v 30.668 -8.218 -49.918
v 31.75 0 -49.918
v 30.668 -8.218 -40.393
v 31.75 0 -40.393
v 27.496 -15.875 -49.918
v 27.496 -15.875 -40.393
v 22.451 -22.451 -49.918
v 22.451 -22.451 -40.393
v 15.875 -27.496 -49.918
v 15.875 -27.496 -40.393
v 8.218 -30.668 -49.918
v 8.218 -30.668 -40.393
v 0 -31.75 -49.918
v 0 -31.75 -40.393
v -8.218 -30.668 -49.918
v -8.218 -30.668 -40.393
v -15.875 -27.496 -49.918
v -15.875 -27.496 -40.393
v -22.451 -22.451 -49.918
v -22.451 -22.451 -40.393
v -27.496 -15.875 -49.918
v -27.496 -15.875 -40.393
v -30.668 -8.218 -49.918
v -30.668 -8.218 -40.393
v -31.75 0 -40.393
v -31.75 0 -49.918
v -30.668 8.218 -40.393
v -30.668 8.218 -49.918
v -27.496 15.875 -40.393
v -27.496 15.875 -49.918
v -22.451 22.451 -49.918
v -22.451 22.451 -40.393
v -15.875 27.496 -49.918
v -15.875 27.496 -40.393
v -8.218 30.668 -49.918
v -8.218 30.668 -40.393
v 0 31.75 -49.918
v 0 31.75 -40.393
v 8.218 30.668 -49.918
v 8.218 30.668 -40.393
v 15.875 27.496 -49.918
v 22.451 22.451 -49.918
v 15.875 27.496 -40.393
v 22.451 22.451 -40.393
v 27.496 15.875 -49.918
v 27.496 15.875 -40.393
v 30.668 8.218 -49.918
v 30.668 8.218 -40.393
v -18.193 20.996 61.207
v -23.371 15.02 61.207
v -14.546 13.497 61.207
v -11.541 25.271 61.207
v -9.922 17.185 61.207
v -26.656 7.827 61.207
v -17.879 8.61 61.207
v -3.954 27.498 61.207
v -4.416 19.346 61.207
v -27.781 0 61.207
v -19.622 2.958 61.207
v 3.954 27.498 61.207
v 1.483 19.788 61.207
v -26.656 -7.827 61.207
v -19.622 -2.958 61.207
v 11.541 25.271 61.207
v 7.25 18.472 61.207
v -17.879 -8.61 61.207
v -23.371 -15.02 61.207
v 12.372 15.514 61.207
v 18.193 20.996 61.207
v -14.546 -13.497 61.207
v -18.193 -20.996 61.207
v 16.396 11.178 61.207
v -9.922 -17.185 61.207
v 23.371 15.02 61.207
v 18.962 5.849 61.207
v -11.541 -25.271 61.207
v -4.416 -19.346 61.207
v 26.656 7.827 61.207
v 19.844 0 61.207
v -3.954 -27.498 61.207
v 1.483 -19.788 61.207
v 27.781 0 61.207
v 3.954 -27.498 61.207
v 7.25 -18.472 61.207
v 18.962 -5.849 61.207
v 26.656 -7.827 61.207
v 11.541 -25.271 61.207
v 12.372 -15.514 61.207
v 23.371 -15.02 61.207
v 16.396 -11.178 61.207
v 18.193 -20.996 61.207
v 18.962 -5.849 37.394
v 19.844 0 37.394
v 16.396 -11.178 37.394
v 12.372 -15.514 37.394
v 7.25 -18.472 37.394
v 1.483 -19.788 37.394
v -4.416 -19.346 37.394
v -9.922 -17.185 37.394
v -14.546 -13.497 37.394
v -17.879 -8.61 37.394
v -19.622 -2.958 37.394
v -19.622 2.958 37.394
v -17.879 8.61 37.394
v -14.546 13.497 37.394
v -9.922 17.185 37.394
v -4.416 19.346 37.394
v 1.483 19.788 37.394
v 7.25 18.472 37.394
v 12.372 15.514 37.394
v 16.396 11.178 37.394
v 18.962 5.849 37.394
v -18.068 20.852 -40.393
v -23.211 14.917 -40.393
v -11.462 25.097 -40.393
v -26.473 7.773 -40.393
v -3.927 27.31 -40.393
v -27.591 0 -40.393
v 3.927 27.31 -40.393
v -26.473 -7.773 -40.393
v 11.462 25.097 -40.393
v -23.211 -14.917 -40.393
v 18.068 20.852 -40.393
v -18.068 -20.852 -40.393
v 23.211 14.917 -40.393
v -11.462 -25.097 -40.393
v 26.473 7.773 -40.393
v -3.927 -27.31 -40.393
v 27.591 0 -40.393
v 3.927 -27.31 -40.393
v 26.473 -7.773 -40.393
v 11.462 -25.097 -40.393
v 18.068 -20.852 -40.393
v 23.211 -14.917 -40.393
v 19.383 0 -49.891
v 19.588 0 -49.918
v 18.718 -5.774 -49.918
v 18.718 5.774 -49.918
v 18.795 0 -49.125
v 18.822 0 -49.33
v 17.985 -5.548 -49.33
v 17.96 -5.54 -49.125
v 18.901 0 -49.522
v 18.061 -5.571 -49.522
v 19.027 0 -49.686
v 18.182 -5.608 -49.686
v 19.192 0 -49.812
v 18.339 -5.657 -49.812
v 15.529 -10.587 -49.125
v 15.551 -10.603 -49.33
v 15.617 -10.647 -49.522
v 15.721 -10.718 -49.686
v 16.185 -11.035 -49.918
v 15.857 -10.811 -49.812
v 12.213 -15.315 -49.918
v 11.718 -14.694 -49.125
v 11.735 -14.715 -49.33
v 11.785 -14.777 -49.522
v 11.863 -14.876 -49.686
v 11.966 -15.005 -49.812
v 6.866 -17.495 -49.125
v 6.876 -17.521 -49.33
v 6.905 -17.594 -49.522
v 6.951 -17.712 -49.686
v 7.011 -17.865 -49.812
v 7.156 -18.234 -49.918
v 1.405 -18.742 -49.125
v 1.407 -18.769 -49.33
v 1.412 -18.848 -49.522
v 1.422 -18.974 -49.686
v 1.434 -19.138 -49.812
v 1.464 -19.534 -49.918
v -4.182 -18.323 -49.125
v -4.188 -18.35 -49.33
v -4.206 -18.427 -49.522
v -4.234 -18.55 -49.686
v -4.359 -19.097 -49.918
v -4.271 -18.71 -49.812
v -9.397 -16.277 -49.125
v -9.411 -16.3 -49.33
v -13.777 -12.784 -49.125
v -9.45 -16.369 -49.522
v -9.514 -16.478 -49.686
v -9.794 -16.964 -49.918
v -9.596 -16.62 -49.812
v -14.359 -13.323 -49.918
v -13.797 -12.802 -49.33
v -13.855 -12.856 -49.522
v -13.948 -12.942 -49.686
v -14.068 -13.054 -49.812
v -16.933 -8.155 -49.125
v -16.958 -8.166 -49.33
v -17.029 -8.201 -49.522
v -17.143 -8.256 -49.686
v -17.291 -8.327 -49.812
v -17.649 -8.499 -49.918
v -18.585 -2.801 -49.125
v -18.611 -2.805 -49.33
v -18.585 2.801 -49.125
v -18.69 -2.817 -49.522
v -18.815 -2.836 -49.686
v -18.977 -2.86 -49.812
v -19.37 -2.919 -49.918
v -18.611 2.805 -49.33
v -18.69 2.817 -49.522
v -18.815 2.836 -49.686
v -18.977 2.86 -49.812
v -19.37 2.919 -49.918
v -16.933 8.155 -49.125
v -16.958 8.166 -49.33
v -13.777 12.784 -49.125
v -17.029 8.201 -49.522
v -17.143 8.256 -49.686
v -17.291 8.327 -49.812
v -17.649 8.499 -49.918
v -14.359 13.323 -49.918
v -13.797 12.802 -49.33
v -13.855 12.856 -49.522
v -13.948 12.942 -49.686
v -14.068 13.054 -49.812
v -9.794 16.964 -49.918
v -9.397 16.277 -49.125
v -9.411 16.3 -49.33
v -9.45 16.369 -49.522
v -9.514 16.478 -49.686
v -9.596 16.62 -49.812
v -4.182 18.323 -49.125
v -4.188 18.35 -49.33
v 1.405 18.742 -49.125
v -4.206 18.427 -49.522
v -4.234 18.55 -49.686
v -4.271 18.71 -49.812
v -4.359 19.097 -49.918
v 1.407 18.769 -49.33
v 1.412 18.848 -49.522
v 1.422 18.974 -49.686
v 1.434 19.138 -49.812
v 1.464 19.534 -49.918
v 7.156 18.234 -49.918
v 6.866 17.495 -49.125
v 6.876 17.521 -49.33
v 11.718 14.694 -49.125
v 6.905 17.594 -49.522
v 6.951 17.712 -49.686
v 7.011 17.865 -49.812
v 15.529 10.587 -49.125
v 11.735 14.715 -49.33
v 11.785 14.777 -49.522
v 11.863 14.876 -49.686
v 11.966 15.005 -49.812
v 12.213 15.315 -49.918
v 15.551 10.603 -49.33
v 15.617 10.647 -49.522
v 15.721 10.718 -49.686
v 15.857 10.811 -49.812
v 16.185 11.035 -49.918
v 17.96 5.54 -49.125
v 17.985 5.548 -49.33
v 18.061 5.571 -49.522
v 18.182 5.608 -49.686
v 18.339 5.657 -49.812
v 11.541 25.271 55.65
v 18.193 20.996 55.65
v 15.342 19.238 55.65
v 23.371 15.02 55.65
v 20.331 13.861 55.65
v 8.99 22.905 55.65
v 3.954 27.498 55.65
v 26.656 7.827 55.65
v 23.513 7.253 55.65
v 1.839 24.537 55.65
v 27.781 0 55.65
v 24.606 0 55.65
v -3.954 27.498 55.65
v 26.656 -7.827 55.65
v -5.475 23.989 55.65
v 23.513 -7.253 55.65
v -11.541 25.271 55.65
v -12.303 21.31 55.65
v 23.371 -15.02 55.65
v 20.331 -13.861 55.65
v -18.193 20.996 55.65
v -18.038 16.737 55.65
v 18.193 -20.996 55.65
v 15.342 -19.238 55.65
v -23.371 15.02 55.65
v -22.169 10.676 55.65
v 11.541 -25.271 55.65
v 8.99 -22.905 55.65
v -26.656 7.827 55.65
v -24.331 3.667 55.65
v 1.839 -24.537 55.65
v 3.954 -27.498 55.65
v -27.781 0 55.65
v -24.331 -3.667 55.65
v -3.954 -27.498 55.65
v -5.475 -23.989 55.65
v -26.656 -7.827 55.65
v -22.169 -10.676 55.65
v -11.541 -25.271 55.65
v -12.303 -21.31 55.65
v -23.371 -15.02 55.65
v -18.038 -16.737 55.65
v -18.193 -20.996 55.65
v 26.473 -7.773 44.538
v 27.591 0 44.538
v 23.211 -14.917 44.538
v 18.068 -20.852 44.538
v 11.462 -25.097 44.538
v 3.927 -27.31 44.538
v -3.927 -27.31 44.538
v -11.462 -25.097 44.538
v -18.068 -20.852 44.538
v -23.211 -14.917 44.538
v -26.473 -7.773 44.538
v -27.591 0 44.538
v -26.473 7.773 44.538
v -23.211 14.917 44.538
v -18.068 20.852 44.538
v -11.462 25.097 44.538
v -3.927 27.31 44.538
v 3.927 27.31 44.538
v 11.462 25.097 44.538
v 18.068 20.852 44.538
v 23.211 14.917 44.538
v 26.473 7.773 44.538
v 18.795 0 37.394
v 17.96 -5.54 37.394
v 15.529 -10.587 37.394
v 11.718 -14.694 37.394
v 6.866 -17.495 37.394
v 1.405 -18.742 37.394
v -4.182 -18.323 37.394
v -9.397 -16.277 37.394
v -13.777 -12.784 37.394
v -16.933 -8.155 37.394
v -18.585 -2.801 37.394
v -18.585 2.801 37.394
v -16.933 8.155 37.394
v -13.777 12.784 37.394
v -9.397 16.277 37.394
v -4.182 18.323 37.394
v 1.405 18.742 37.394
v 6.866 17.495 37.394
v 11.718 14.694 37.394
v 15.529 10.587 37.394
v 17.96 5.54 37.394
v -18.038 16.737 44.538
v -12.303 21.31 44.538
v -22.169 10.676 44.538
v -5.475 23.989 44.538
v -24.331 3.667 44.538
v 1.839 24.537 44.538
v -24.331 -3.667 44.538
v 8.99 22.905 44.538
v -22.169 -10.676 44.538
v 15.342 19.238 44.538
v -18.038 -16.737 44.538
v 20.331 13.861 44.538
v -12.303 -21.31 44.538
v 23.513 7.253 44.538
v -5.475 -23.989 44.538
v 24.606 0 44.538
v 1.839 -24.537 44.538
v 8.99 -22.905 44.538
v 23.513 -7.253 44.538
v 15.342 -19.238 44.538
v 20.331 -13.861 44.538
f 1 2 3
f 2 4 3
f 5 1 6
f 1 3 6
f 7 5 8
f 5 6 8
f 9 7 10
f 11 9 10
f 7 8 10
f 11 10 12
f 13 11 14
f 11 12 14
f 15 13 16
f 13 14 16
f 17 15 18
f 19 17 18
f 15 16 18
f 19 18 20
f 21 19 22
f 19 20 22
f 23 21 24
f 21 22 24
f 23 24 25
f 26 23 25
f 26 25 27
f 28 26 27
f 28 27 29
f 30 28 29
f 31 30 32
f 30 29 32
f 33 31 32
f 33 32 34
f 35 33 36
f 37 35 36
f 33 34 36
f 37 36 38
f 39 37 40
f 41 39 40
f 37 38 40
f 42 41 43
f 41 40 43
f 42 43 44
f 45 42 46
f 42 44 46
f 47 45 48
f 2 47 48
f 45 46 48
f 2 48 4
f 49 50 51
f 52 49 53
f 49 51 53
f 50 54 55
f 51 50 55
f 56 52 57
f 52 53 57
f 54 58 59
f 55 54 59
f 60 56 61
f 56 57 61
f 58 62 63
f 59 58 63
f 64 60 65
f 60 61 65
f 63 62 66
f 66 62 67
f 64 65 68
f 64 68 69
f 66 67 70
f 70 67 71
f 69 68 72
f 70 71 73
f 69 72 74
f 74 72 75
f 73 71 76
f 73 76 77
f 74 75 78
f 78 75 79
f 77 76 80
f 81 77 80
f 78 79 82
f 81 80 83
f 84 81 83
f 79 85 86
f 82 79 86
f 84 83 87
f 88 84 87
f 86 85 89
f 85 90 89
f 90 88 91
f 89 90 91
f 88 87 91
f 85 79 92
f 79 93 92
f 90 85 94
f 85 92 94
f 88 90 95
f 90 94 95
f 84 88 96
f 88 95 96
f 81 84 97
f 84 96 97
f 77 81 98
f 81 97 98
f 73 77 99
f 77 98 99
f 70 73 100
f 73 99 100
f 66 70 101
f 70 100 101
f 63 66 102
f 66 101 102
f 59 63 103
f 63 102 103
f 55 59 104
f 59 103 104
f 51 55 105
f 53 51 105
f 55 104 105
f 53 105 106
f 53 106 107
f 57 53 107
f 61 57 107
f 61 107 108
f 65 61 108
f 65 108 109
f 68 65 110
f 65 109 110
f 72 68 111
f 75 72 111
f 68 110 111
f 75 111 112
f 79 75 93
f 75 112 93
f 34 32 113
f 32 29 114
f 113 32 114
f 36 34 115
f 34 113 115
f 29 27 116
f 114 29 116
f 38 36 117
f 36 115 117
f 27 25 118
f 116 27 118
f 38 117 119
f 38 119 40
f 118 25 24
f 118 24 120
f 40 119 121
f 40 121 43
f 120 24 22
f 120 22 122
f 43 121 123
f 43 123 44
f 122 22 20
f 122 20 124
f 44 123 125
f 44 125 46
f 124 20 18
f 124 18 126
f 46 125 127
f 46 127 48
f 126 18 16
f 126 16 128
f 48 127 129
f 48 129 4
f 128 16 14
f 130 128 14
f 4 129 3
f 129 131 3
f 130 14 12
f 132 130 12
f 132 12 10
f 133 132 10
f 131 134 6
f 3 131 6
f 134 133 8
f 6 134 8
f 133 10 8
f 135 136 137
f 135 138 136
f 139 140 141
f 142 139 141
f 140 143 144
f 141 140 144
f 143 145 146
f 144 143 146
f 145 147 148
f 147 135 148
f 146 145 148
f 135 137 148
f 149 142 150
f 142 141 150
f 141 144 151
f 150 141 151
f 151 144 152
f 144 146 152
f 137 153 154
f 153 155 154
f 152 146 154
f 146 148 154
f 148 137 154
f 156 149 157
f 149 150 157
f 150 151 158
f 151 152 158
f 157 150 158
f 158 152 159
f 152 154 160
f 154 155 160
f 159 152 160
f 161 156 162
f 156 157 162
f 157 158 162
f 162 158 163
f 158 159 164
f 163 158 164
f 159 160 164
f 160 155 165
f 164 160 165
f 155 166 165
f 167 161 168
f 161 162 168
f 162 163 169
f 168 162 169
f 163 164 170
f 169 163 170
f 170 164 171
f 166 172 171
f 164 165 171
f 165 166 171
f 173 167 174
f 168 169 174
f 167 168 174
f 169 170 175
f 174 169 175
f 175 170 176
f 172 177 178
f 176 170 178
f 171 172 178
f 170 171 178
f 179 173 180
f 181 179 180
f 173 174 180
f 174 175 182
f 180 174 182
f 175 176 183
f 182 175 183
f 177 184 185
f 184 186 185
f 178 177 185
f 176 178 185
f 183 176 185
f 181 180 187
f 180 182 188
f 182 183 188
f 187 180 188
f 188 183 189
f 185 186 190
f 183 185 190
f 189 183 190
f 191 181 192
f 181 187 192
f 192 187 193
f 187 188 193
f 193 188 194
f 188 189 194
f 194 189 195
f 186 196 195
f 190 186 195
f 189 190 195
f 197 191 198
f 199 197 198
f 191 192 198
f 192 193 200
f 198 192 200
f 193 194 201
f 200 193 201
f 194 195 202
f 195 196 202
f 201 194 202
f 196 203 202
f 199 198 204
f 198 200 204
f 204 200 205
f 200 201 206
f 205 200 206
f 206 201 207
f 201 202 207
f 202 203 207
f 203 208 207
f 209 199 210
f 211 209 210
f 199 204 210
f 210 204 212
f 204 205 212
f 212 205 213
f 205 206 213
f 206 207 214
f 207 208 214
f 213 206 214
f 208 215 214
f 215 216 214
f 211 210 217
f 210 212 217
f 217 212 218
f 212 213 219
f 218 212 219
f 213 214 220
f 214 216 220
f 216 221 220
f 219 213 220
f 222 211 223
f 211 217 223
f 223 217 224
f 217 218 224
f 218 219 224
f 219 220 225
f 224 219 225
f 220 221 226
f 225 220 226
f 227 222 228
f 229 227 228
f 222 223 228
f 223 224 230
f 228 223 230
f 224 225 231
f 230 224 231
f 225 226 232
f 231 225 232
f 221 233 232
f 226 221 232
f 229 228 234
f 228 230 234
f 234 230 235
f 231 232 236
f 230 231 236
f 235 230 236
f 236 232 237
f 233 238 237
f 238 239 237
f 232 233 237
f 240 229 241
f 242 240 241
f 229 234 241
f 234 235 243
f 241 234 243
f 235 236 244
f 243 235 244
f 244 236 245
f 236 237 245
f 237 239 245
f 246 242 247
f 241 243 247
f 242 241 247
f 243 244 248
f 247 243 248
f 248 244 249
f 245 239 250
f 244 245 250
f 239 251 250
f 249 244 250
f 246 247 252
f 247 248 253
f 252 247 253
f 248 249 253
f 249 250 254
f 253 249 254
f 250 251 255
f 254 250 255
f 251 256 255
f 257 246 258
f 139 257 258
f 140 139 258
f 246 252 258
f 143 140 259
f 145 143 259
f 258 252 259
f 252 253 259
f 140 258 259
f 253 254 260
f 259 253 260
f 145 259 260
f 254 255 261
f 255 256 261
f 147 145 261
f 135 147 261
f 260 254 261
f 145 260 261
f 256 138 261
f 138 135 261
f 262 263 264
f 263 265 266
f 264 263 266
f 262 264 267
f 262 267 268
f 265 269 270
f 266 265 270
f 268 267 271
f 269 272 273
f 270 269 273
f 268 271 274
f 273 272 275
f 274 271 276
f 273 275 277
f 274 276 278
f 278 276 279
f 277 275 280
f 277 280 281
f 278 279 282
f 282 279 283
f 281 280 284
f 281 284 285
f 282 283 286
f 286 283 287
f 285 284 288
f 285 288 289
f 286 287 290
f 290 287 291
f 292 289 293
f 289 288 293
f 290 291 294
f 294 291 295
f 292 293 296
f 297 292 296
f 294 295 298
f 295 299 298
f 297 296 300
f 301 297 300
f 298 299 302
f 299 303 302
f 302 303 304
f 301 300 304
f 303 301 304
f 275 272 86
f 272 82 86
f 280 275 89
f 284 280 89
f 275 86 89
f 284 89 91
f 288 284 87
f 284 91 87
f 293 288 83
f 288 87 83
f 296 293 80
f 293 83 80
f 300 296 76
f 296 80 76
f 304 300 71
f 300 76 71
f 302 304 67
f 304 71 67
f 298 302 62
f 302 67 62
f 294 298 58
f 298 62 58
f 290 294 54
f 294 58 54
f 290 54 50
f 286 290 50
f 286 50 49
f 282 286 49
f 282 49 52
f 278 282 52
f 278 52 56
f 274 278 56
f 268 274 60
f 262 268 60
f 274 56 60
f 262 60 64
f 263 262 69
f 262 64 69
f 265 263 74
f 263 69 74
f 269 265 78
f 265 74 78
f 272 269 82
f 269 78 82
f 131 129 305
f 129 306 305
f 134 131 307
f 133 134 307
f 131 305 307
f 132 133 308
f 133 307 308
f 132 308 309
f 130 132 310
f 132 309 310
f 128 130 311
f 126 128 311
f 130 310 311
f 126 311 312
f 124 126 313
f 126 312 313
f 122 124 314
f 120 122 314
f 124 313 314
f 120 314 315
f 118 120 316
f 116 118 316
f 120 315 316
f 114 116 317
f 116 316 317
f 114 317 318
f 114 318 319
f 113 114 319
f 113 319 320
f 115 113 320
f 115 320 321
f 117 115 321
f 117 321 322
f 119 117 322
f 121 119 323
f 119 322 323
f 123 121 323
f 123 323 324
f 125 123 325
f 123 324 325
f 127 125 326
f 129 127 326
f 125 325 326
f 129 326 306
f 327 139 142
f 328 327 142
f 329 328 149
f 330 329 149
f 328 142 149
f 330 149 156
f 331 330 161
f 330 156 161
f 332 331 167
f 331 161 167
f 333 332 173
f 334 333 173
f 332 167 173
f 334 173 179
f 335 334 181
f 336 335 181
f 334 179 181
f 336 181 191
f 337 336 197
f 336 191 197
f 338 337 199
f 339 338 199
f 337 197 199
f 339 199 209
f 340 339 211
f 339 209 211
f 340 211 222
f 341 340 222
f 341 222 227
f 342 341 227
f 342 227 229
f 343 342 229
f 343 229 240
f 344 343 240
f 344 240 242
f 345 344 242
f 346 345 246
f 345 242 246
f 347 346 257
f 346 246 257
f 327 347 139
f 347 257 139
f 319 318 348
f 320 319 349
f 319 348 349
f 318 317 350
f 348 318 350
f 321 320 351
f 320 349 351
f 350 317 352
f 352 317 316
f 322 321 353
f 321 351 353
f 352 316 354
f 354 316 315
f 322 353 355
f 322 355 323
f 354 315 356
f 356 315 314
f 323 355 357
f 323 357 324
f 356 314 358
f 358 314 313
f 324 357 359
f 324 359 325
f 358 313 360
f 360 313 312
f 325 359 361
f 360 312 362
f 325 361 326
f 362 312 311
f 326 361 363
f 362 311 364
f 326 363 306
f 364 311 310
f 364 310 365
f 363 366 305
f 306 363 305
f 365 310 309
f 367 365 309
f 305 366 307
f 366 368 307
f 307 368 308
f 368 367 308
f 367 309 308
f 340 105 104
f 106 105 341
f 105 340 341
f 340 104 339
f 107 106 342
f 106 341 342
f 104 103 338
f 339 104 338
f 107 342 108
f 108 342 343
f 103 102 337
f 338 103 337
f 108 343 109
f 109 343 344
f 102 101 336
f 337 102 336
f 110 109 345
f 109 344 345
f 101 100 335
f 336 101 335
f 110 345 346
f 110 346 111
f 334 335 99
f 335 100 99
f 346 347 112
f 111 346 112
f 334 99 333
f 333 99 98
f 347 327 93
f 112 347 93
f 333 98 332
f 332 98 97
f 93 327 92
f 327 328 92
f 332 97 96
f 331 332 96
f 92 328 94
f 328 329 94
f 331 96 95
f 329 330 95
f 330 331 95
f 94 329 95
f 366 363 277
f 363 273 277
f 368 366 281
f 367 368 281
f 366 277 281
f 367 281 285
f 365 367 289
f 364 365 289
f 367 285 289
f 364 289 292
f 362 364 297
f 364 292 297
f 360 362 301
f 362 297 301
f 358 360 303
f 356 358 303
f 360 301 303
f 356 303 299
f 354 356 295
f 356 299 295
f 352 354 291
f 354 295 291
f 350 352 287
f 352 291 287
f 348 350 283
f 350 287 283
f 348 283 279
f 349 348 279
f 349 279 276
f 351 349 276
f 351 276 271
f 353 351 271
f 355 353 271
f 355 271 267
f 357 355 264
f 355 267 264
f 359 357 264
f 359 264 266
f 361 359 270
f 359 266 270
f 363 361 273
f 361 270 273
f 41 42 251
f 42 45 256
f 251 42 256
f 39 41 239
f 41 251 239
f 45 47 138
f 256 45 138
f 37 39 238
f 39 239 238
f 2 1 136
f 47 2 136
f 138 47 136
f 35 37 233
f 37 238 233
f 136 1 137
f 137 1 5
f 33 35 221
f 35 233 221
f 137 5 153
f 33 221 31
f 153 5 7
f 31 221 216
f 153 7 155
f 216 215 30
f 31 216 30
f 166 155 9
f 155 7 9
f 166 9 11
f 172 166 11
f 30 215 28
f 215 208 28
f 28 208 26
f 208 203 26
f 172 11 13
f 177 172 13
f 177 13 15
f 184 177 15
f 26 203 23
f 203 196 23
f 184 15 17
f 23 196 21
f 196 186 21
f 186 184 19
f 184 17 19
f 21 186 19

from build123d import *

# Parameters (mm, degrees)
FILLET1_R = 0.79375


with BuildPart() as part:
    # Sketch1 → Revolve1 (revolve)
    with BuildSketch(Plane(origin=(0, 0, 0), x_dir=(0, 0, -1), z_dir=(1, 0, 0)), mode=Mode.PRIVATE) as revolve1_sk:
        Polygon((-61.206526461, 19.84375), (-37.394026461, 19.84375), (-37.394026461, 18.794647739), (49.918473539, 18.794647739), (49.918473539, 31.75), (40.393473539, 31.75), (40.393473539, 27.590649684), (-44.537776461, 27.590649684), (-44.537776461, 24.60625), (-55.650276461, 24.60625), (-55.650276461, 27.78125), (-61.206526461, 27.78125), align=None)
    revolve(revolve1_sk.sketch.rotate(Axis((0, 0, 20.539691943), (0, 0, -1)), 90), axis=Axis((0, 0, 20.539691943), (0, 0, -1)))

    # Fillet1
    fillet1_edges = [part.edges().sort_by_distance(p)[0] for p in [
        (-18.794647739, 0, -49.918473539),
    ]]
    fillet(fillet1_edges, radius=FILLET1_R)


solid = part.part
